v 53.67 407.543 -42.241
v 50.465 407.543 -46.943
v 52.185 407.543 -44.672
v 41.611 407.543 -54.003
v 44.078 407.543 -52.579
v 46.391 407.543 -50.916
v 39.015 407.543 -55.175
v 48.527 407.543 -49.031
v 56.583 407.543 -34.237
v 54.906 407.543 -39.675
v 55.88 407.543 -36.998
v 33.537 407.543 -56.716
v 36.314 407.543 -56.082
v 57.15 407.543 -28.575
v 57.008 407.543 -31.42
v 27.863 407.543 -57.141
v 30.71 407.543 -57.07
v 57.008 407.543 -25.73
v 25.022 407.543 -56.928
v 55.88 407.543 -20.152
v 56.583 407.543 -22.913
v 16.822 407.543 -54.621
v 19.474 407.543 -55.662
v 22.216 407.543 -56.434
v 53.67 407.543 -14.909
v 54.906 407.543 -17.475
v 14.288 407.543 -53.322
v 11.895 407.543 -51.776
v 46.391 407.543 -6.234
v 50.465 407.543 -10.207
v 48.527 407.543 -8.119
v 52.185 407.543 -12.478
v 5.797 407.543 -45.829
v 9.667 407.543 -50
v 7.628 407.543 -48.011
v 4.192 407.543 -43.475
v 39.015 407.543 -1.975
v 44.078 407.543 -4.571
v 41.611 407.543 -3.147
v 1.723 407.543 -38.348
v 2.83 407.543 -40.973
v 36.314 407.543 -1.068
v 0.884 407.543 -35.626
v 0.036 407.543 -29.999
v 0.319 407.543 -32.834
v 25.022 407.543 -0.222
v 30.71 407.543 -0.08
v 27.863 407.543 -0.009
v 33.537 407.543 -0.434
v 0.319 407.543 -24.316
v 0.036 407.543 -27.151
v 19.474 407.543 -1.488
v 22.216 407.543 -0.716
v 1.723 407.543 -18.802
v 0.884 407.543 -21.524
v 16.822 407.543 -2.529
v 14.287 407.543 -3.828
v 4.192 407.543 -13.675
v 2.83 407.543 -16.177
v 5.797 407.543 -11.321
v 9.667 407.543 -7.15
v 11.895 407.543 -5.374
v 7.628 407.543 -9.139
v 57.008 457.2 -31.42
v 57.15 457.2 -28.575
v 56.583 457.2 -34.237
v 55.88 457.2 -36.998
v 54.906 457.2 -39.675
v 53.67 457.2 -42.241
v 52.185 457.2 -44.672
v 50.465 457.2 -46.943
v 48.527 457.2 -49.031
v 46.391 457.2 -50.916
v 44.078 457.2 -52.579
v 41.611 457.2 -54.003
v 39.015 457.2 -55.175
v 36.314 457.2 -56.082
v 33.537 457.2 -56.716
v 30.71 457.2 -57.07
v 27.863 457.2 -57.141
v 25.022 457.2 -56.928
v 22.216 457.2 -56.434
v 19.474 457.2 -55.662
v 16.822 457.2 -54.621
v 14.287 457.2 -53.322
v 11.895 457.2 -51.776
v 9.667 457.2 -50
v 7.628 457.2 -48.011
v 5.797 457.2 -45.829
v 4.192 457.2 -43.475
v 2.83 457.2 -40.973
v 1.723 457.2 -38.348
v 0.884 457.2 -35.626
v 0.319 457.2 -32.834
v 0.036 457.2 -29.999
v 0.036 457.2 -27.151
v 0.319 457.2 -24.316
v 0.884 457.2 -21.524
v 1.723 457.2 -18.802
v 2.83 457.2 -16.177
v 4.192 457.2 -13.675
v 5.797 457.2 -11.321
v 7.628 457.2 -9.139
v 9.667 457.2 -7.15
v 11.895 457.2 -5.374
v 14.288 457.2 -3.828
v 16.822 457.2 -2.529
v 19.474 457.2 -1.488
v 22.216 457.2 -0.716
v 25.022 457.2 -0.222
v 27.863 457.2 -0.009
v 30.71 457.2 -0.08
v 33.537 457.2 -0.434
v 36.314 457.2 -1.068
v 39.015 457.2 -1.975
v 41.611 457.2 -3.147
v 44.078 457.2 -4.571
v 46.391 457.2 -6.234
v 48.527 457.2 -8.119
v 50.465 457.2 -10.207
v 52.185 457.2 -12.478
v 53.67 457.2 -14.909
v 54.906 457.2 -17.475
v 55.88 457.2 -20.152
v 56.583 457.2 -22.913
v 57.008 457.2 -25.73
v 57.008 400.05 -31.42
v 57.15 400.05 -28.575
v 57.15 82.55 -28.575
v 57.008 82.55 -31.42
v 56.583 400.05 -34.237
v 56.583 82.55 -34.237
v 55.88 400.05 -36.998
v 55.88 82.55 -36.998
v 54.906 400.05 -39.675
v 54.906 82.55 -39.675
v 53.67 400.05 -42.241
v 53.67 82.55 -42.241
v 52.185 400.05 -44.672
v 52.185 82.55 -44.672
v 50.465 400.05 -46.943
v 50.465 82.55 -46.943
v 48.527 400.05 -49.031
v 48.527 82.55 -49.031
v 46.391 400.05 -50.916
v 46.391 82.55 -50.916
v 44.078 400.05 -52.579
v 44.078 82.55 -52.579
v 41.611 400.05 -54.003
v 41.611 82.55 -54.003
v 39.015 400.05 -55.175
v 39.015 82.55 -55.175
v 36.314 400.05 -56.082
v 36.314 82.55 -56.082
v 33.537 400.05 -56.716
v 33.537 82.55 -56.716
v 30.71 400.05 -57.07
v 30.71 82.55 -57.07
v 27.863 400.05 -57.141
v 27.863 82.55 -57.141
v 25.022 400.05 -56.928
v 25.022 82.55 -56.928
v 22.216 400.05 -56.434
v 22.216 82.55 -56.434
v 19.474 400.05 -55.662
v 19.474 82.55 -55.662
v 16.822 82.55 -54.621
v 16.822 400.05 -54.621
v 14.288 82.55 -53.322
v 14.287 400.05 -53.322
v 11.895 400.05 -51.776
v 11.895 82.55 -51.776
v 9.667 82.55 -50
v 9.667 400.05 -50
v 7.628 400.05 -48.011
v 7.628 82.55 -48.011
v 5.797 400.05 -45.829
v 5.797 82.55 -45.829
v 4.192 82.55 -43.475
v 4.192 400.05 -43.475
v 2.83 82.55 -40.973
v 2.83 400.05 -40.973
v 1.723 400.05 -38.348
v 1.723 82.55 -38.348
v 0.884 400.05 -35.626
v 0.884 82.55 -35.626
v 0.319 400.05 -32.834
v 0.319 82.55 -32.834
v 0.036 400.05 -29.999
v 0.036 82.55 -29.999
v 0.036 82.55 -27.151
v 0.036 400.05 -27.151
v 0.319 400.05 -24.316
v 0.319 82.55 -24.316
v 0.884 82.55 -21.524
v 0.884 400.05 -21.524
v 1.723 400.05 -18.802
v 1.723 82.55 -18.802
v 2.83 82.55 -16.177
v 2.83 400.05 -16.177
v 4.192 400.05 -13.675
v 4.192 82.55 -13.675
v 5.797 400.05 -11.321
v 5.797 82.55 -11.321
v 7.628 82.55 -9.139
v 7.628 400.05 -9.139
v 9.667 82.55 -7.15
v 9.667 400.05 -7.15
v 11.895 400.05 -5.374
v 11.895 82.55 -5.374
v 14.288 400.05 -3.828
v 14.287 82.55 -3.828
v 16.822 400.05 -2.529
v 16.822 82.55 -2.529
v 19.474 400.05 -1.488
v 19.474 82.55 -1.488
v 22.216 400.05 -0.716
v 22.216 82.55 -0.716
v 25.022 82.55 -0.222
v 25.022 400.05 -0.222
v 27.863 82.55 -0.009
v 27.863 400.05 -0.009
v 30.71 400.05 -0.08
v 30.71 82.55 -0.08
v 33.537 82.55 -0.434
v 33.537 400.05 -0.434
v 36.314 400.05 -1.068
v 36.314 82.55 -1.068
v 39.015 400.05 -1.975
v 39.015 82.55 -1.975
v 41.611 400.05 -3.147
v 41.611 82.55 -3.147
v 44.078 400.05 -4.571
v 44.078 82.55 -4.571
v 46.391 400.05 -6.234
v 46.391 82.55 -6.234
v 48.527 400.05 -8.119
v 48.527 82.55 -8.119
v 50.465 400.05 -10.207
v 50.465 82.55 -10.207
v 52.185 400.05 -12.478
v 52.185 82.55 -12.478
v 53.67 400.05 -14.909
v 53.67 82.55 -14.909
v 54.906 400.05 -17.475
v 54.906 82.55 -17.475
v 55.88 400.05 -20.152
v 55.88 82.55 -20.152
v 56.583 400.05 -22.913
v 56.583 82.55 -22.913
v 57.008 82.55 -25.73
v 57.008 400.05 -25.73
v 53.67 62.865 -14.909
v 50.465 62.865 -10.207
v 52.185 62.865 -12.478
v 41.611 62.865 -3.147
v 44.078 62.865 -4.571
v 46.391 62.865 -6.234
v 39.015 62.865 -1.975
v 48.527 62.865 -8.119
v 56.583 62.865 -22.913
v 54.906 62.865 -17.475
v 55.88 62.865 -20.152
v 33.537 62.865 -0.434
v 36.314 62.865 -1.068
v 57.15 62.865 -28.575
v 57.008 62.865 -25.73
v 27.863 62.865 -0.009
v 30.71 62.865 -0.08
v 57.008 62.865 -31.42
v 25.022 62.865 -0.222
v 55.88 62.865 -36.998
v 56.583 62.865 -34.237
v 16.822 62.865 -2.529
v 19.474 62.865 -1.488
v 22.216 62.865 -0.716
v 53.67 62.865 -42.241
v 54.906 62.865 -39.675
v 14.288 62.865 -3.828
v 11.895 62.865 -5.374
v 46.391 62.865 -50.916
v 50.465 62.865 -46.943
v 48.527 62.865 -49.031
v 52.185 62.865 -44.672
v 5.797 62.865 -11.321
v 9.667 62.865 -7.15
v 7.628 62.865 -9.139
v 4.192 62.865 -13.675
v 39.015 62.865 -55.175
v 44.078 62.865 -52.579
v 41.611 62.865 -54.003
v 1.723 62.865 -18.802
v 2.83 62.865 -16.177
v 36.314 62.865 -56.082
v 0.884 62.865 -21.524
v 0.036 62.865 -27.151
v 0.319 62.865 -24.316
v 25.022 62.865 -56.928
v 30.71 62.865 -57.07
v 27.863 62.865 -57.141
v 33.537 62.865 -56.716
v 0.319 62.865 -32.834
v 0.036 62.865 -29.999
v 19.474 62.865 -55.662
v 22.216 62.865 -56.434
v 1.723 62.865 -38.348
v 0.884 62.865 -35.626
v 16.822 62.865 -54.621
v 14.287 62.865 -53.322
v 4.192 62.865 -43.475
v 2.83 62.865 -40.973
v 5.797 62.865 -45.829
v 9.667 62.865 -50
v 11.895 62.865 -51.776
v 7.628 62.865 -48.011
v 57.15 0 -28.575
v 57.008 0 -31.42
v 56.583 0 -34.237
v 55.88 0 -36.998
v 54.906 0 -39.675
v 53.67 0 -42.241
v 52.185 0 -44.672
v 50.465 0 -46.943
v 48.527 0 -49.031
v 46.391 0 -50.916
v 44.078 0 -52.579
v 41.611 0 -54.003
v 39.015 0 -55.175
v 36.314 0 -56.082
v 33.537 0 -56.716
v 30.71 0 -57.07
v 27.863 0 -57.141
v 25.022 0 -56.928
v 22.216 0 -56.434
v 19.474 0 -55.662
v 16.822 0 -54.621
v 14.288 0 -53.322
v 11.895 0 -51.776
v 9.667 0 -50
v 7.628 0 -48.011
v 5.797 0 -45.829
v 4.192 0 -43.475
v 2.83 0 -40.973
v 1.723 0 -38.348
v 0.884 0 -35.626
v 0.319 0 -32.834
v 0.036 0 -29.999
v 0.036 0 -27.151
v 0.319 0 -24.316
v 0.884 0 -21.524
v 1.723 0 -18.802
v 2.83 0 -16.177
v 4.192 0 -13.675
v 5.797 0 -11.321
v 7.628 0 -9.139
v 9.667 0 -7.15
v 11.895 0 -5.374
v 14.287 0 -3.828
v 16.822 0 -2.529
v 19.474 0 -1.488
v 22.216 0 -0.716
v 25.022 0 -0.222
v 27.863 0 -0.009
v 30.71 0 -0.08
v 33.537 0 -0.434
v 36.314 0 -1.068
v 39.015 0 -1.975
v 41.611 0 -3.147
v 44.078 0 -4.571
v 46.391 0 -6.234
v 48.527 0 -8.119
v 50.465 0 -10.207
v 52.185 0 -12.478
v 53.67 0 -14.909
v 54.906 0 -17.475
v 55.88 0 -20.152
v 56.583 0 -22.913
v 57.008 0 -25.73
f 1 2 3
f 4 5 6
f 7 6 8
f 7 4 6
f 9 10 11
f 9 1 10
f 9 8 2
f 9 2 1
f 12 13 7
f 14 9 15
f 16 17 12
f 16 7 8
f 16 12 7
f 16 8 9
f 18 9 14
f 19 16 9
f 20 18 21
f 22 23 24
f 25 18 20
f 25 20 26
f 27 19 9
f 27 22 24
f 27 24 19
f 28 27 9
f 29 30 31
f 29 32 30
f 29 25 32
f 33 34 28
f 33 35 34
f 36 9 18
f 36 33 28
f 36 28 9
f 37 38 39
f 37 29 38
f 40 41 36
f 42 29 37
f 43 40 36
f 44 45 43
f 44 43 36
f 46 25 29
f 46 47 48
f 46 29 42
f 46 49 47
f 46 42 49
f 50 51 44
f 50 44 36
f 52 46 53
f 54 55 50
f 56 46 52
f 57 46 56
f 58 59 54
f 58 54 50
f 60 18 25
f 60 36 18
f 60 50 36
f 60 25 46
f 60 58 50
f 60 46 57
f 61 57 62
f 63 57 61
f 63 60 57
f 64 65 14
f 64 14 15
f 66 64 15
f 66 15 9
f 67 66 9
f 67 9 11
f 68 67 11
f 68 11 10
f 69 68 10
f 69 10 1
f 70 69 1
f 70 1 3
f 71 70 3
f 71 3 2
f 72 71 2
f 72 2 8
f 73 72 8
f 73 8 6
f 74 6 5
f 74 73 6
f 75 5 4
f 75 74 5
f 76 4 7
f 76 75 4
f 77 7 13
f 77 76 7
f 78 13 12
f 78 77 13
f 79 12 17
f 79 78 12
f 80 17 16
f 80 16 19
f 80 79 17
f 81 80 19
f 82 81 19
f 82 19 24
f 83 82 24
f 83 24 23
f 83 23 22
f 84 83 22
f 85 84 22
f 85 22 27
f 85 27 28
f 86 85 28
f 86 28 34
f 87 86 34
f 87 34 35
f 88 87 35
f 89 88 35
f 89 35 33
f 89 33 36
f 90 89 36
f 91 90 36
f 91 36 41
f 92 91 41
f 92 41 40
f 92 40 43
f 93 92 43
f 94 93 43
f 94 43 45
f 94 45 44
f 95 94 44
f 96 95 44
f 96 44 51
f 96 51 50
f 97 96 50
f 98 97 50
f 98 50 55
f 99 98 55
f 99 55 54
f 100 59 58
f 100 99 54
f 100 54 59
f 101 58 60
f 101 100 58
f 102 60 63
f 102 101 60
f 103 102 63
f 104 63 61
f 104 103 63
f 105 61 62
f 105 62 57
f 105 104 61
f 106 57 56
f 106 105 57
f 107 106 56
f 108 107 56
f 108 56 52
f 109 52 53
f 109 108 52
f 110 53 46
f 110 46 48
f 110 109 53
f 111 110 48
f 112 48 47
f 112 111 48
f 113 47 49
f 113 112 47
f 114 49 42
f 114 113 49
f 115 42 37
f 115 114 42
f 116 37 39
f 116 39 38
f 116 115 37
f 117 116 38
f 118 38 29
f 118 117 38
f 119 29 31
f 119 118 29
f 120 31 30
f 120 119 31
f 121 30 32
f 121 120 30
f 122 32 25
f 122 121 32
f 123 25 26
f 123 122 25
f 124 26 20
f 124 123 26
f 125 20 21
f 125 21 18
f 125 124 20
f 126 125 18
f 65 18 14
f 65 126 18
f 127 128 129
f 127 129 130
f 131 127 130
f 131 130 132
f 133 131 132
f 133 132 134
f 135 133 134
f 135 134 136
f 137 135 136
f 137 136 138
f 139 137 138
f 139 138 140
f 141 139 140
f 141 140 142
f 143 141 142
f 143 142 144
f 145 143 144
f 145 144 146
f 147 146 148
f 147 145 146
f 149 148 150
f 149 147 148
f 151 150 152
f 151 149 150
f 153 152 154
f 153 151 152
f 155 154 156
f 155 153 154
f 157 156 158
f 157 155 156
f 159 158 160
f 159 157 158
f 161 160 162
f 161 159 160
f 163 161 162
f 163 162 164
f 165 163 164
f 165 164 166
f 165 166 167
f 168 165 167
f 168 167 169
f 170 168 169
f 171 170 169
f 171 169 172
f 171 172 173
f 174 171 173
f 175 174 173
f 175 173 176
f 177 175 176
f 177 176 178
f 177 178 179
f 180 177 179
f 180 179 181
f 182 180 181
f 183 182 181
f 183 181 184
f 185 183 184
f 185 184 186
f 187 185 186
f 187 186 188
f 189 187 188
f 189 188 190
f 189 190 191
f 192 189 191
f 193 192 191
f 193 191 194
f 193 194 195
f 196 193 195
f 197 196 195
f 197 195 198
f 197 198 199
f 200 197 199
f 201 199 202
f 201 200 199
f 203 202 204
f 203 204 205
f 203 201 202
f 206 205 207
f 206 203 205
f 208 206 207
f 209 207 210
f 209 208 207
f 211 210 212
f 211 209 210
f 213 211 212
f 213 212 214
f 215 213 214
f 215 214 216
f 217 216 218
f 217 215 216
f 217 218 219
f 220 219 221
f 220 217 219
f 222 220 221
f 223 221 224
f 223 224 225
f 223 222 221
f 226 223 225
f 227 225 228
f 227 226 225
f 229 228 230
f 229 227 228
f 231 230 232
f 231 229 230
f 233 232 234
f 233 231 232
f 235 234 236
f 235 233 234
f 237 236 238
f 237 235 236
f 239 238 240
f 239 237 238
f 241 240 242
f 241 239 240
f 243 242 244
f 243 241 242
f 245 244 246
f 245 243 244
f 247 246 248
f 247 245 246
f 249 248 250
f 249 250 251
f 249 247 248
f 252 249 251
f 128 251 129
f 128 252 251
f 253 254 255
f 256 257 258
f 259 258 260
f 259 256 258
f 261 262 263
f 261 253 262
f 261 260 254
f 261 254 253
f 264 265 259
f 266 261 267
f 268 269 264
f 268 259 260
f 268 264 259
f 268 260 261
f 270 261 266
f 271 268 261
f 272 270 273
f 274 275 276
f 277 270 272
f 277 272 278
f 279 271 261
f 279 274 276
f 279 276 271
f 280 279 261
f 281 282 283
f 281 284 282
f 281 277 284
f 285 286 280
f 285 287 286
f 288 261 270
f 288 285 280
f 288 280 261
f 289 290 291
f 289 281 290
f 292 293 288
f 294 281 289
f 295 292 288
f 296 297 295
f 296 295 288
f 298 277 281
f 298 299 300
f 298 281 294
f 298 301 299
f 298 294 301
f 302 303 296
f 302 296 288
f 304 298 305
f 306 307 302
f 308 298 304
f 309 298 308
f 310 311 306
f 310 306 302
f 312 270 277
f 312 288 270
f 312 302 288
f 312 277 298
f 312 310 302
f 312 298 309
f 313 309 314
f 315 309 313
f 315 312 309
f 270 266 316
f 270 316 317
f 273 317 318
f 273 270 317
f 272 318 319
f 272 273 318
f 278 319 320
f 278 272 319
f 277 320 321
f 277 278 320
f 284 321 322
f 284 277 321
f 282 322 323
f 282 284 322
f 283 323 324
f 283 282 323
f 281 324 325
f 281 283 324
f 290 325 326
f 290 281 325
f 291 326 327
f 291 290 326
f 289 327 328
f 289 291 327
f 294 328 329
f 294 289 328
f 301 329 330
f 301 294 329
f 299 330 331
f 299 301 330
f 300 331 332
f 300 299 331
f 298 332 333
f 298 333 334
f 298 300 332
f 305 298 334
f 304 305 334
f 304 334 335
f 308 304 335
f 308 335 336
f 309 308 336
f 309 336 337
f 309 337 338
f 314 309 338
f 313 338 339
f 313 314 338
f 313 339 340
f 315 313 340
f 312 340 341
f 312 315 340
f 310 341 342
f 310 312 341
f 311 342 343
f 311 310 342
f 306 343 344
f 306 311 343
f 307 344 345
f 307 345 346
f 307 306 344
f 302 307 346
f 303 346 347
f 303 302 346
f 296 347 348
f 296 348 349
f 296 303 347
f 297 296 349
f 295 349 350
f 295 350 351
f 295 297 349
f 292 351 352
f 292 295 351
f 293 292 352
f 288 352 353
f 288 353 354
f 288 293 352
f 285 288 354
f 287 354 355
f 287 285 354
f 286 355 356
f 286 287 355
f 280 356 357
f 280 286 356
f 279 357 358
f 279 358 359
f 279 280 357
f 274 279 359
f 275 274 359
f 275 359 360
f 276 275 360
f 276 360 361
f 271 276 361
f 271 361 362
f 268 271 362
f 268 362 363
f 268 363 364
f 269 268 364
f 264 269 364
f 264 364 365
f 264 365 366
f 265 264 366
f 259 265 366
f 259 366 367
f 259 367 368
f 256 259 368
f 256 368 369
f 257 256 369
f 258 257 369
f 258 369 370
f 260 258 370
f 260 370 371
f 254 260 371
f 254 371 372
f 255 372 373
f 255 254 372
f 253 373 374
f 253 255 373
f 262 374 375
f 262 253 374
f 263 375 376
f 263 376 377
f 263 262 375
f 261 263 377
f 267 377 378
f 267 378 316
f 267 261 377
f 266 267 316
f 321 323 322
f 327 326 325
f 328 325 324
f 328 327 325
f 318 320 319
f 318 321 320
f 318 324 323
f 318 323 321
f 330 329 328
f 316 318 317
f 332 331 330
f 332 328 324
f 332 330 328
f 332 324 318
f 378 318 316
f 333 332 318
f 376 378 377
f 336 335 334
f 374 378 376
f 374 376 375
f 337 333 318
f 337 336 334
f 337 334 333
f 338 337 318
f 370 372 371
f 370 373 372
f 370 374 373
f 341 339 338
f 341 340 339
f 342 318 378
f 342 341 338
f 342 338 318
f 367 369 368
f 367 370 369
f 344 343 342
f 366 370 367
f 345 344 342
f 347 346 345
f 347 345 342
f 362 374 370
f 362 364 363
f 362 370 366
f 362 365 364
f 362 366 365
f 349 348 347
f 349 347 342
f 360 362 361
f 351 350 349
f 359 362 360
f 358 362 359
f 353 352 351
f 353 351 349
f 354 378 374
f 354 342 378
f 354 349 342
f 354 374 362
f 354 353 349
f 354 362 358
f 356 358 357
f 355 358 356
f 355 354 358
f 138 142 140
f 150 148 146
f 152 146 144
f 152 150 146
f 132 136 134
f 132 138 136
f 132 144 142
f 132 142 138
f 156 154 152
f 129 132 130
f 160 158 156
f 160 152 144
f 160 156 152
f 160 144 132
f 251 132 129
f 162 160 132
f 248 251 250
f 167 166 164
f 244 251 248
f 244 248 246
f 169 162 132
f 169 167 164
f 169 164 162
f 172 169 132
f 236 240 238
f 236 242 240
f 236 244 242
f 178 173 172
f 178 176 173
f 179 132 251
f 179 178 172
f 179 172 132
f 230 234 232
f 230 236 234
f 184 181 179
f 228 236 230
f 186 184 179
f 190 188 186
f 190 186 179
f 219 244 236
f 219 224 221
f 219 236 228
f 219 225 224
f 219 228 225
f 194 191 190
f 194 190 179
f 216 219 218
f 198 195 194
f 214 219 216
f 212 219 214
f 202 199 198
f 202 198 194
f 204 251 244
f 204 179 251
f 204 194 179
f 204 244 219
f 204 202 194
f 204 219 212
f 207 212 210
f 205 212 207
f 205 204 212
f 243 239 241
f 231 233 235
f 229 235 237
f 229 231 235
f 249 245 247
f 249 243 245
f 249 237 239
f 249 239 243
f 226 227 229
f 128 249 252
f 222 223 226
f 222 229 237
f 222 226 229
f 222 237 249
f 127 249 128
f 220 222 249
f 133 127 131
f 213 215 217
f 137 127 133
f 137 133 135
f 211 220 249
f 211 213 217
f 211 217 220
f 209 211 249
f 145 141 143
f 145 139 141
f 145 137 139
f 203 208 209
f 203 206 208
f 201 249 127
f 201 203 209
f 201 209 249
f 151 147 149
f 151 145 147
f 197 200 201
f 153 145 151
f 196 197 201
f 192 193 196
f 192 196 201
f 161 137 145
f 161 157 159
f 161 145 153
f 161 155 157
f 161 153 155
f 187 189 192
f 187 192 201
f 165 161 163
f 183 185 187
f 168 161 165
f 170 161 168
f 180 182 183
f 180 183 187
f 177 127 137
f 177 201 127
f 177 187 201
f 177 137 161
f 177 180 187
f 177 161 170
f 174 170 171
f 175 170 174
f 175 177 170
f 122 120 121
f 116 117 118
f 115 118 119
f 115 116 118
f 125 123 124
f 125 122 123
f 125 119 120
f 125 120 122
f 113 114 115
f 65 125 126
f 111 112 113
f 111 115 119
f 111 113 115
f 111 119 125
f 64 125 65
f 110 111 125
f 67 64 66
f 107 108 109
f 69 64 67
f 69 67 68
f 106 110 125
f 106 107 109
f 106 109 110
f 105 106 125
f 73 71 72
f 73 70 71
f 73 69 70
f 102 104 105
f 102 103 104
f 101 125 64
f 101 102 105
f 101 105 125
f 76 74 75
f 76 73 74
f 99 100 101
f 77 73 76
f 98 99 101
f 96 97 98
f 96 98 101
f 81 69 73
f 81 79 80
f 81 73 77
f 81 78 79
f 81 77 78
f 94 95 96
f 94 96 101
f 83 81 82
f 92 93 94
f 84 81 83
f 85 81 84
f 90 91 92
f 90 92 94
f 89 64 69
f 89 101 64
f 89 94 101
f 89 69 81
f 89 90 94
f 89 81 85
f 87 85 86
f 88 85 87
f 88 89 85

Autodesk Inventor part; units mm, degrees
ref_plane "YZ Plane" through (0, 0, 0) normal (1, 0, 0) x (0, 1, 0)
ref_plane "XZ Plane" through (0, 0, 0) normal (0, 1, 0) x (-1, 0, 0)
ref_plane "XY Plane" through (0, 0, 0) normal (0, 0, 1) x (1, 0, 0)
sketch "Sketch2" plane through (0, 0, 0) normal (1, 0, 0) x (0, 1, 0)
  line L0 (0, 0) -> (457.2, 0)
  line L1 (457.2, 0) -> (457.2, -57.15)
  line L2 (457.2, -57.15) -> (0, -57.15)
  line L3 (0, -57.15) -> (0, 0)
  line L4 (407.543, 0) -> (400.05, 0)
  line L5 (400.05, 0) -> (400.05, -57.15)
  line L6 (400.05, -57.15) -> (407.543, -57.15)
  line L7 (407.543, -57.15) -> (407.543, 0)
  line L8 (82.55, 0) -> (62.865, 0)
  line L9 (62.865, 0) -> (62.865, -57.15)
  line L10 (62.865, -57.15) -> (82.55, -57.15)
  line L11 (82.55, -57.15) -> (82.55, 0)
  dimension "d3" = 457.2
  dimension "d4" = 57.15
  dimension "d5" = 7.493
  dimension "d6" = 49.657
  dimension "d7" = 19.685
  dimension "d8" = 62.865
extrude "Extrusion2" add sketch "Sketch2" along normal blind 57.15 contours L0 L9 L2 L3 | L0 L5 L2 L11 | L0 L1 L2 L7
sketch "Sketch3" plane through (0, 457.2, 0) normal (0, 1, 0) x (1, 0, 0)
  circle A0 centre (28.575, 28.575) radius 28.575
  line L0 (0, 57.15) -> (0, 0) projected
  line L1 (0, 0) -> (57.15, 0) projected
  line L2 (57.15, 57.15) -> (57.15, 0) projected
  line L3 (0, 57.15) -> (57.15, 57.15) projected
  dimension "d11" = 57.15
  dimension "d12" = 28.575
  dimension "d13" = 28.575
extrude "Extrusion3" cut sketch "Sketch3" against normal blind 457.2 contours L2 L1 A0 | A0 L3 L2 | A0 L0 L3 | L1 L0 A0
properties part number "RollerFull"
